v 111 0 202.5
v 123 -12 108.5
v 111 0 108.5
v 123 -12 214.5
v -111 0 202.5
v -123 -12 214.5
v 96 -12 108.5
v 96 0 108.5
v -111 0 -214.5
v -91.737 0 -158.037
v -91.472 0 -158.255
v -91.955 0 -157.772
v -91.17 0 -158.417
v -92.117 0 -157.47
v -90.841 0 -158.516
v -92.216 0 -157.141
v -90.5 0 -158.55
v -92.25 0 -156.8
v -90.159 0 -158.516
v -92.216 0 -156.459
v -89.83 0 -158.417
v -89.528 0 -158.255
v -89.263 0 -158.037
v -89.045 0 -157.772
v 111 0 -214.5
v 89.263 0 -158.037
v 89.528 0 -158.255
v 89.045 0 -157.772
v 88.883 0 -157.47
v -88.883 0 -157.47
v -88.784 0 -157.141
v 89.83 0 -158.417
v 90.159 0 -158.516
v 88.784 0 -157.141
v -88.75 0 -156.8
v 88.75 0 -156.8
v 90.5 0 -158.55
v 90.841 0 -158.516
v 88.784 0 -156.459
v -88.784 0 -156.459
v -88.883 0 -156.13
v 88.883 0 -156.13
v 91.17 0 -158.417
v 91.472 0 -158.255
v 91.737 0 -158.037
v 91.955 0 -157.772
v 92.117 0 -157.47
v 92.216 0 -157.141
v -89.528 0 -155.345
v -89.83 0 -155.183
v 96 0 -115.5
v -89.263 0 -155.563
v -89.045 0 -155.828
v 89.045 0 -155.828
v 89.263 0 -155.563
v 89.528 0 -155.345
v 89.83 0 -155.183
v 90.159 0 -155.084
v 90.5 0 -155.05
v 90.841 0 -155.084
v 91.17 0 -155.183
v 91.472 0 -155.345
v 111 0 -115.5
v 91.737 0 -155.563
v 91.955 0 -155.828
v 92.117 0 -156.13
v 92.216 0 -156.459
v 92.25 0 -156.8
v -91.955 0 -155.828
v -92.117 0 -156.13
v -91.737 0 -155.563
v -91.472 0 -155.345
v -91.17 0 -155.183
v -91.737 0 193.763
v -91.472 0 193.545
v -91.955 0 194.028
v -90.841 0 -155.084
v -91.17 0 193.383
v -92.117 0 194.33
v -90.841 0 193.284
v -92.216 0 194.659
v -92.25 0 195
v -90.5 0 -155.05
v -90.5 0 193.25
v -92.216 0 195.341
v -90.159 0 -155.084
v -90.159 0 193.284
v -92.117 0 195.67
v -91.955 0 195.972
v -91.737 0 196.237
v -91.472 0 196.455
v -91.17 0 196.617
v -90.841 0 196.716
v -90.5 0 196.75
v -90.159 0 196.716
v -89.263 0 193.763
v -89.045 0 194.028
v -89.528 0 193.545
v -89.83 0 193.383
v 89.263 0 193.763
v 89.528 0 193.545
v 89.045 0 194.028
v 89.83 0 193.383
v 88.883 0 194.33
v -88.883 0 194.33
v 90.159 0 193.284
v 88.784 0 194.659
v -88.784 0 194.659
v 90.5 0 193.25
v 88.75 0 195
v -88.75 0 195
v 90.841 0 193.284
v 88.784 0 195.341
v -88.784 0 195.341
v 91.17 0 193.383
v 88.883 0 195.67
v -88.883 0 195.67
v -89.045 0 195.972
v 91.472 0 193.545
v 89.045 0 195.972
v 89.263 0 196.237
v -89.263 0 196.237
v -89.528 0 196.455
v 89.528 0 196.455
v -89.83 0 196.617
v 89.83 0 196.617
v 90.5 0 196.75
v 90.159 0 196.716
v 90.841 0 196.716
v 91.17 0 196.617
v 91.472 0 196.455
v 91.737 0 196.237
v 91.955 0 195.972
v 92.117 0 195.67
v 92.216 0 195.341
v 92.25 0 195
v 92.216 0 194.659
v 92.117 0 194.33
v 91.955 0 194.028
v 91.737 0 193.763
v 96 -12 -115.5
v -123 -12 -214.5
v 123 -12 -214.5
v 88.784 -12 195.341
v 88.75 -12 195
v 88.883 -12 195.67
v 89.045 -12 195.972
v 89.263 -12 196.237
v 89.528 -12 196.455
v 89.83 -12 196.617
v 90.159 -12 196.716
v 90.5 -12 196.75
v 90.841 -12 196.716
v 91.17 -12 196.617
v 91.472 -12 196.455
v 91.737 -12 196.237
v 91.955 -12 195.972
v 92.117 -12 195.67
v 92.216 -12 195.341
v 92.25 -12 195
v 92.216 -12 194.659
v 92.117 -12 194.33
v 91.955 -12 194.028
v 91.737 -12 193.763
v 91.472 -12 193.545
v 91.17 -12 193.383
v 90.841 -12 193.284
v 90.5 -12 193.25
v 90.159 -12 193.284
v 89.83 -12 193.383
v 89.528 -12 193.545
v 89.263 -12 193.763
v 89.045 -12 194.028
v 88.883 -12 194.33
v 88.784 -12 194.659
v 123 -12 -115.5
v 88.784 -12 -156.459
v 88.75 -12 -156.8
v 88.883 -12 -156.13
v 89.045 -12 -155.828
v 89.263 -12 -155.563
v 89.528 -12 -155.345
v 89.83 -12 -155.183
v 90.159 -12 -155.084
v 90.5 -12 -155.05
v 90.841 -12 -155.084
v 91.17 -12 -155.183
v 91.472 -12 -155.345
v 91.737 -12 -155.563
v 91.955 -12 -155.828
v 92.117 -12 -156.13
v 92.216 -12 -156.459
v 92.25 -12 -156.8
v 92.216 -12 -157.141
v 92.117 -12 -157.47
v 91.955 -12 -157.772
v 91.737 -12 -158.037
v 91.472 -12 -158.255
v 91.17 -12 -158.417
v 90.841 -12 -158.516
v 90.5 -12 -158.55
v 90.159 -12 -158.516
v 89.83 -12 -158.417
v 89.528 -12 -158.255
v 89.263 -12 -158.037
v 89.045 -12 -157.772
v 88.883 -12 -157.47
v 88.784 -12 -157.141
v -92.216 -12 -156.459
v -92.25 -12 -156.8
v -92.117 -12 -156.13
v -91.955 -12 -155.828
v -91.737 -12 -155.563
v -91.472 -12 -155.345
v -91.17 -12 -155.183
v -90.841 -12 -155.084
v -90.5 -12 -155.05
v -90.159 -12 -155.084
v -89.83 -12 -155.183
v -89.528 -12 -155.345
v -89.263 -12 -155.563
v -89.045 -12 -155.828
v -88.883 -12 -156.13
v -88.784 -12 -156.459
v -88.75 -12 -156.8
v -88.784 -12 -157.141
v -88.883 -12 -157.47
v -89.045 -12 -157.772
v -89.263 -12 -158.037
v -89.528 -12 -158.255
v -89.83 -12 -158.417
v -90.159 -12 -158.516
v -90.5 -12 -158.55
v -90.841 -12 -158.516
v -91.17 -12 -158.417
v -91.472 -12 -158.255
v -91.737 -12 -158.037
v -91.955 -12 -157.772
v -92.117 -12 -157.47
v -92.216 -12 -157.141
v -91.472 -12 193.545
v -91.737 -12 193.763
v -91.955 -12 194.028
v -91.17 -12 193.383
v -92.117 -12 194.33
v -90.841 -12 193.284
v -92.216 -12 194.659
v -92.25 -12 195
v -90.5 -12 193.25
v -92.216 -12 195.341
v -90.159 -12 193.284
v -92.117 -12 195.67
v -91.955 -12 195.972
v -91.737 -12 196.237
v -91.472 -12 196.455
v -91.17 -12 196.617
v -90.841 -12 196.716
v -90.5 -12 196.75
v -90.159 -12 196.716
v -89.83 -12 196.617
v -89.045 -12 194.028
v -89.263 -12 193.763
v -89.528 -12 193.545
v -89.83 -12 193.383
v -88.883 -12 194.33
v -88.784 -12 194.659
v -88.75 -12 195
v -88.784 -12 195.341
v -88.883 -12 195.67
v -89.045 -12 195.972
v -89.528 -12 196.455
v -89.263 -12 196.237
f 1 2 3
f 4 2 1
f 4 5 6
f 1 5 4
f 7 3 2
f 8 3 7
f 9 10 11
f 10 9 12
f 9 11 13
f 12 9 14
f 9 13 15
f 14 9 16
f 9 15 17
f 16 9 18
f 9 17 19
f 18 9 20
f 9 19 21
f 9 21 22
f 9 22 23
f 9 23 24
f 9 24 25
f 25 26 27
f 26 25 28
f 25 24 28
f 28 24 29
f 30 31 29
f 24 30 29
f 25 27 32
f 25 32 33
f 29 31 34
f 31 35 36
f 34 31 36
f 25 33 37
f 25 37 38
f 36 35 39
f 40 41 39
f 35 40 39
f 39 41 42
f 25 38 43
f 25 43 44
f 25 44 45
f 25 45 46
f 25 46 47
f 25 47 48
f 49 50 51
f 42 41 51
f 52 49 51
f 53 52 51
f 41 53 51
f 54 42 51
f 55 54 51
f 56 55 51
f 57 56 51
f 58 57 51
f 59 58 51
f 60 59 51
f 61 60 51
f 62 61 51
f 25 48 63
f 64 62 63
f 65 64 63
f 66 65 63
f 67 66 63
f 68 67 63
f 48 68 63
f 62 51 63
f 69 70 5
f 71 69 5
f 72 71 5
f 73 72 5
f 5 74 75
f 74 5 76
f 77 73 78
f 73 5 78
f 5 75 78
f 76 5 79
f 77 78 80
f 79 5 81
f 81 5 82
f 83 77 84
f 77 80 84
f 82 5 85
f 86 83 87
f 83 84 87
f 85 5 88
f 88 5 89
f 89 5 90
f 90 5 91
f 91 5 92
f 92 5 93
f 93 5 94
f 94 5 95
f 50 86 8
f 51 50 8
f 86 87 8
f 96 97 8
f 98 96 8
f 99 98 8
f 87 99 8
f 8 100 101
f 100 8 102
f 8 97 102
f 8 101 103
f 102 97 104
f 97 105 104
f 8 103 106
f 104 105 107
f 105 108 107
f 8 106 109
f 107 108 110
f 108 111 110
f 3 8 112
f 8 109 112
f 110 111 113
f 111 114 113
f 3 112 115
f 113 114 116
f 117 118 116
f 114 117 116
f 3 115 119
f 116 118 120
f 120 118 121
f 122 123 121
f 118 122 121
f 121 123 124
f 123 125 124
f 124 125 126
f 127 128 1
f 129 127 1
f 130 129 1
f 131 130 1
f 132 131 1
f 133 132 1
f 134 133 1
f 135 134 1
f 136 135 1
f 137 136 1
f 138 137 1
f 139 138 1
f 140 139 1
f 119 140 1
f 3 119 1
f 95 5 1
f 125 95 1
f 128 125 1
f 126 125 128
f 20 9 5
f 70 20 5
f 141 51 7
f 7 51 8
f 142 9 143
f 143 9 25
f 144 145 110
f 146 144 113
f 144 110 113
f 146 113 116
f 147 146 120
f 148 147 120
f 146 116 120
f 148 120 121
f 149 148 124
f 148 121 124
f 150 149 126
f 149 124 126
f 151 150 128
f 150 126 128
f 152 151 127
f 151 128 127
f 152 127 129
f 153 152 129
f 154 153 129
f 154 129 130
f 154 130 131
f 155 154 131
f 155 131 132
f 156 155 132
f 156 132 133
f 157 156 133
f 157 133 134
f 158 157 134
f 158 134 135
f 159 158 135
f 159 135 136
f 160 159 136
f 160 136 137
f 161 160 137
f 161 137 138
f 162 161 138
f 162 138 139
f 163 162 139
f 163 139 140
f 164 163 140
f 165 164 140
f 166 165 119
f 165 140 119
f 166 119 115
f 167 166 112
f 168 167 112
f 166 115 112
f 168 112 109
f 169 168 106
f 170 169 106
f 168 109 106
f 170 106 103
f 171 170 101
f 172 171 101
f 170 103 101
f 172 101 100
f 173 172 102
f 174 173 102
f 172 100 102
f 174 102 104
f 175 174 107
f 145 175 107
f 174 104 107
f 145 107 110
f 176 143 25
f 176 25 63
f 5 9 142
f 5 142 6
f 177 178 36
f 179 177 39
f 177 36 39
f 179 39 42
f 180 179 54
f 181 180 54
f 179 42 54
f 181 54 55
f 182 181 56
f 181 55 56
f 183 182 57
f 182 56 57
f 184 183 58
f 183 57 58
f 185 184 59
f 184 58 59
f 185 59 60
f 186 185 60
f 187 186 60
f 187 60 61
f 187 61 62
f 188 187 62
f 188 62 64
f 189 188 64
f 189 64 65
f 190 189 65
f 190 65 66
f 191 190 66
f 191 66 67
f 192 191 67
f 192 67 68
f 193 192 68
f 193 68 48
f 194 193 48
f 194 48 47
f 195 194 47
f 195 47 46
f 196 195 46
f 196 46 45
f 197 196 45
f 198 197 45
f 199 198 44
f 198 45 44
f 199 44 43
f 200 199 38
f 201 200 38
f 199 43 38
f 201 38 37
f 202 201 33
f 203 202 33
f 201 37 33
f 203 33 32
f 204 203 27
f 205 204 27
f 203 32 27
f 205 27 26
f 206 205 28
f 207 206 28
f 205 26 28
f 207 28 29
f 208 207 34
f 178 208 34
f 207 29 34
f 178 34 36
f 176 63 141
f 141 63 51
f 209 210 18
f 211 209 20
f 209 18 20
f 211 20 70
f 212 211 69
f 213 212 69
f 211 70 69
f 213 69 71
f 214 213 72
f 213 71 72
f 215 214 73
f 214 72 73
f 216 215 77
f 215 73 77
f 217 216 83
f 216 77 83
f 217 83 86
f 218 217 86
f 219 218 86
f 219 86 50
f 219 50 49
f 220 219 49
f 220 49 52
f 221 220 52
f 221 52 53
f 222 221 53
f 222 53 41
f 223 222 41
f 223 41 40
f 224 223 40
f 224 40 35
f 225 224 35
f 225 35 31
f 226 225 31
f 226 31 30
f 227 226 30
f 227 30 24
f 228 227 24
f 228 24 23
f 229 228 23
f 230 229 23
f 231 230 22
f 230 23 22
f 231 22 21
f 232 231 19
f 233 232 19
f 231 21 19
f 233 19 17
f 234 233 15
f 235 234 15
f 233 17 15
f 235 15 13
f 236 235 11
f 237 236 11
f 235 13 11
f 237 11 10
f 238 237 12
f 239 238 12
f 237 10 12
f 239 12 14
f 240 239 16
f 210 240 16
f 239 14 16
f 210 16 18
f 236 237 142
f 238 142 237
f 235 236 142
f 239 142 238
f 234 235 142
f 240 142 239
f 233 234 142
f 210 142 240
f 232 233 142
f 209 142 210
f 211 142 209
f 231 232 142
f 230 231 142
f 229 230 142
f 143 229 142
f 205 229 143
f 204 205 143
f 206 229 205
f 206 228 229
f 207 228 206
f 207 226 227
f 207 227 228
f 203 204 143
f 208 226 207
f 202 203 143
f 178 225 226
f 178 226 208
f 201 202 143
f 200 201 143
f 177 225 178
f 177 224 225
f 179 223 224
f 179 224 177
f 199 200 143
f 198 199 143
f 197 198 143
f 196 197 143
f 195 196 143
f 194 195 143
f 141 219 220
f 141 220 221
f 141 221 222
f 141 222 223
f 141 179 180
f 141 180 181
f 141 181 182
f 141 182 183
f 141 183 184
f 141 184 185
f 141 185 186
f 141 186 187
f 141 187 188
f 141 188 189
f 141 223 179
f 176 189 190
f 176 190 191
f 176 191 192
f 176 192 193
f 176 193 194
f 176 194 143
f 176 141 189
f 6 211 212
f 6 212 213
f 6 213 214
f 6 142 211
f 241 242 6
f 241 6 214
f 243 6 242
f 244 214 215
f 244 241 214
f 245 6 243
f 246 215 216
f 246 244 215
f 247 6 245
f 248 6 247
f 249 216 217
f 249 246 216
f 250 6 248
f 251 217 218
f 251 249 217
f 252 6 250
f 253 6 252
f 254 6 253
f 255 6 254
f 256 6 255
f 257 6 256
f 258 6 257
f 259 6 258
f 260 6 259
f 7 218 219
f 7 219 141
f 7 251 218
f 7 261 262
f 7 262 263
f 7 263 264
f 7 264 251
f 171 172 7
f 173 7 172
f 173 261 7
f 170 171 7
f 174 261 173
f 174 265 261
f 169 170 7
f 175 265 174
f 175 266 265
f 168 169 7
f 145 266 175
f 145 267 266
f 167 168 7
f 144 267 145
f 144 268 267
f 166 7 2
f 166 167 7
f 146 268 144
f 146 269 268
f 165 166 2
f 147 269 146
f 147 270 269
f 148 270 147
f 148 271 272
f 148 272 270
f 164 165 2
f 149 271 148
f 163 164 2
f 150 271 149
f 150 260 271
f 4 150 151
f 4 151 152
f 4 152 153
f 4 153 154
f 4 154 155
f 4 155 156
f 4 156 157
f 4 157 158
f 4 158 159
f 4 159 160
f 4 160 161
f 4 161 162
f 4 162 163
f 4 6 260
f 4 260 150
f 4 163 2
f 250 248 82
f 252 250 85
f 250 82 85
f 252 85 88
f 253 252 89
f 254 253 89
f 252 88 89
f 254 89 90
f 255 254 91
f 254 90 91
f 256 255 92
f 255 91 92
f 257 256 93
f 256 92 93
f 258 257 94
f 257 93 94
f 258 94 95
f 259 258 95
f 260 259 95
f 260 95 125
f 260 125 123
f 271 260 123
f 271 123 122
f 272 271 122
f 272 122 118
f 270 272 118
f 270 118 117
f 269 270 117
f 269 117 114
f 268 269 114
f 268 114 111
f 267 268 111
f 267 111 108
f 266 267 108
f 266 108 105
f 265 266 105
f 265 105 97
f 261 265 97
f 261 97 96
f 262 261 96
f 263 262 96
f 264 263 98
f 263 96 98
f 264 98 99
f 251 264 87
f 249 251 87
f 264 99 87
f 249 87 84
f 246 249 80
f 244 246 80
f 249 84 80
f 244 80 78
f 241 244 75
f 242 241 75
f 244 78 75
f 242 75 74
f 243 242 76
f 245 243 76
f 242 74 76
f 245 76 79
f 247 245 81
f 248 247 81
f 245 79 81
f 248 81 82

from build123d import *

# Parameters (mm, degrees)
F0_W     = 246
F0_H     = 429
F1_DEPTH = 12
F2_W     = 27
F2_H     = 224
F3_DEPTH = 25
F4_SIZE  = 11.99999
F6_D     = 3.5


# Not quite as in the source:
# - a fillet or chamfer is up to 0.001 mm smaller than in the source, because OpenCascade refuses the exact size


with BuildPart() as f1:
    # F0 (on Front) → F1 (new body)
    with BuildSketch(Plane.XZ):
        Rectangle(F0_W, F0_H)
    extrude(amount=F1_DEPTH)

    # F2 (on face) → F3 (cut)
    with BuildSketch(Plane(origin=(0, 0, 0), x_dir=(-1, 0, 0), z_dir=(0, 1, 0))):
        with Locations((-109.5, -3.5)):
            Rectangle(F2_W, F2_H)
    extrude(amount=-F3_DEPTH, mode=Mode.SUBTRACT)

    # F4 (size 12 in the source; OpenCascade refuses exactly that, so slightly less here)
    f4_edges = [f1.edges().sort_by_distance(p)[0] for p in [
        (0, 0, 214.5),
        (-123, 0, 0),
        (123, 0, 161.5),
        (123, 0, -165),
    ]]
    chamfer(f4_edges, length=F4_SIZE)

    # F6 (through all)
    with Locations(Plane.XZ.offset(12)):
        with Locations((-90.5, 195), (90.5, 195), (90.5, -156.8), (-90.5, -156.8)):
            Hole(F6_D / 2)


solid = f1.part
